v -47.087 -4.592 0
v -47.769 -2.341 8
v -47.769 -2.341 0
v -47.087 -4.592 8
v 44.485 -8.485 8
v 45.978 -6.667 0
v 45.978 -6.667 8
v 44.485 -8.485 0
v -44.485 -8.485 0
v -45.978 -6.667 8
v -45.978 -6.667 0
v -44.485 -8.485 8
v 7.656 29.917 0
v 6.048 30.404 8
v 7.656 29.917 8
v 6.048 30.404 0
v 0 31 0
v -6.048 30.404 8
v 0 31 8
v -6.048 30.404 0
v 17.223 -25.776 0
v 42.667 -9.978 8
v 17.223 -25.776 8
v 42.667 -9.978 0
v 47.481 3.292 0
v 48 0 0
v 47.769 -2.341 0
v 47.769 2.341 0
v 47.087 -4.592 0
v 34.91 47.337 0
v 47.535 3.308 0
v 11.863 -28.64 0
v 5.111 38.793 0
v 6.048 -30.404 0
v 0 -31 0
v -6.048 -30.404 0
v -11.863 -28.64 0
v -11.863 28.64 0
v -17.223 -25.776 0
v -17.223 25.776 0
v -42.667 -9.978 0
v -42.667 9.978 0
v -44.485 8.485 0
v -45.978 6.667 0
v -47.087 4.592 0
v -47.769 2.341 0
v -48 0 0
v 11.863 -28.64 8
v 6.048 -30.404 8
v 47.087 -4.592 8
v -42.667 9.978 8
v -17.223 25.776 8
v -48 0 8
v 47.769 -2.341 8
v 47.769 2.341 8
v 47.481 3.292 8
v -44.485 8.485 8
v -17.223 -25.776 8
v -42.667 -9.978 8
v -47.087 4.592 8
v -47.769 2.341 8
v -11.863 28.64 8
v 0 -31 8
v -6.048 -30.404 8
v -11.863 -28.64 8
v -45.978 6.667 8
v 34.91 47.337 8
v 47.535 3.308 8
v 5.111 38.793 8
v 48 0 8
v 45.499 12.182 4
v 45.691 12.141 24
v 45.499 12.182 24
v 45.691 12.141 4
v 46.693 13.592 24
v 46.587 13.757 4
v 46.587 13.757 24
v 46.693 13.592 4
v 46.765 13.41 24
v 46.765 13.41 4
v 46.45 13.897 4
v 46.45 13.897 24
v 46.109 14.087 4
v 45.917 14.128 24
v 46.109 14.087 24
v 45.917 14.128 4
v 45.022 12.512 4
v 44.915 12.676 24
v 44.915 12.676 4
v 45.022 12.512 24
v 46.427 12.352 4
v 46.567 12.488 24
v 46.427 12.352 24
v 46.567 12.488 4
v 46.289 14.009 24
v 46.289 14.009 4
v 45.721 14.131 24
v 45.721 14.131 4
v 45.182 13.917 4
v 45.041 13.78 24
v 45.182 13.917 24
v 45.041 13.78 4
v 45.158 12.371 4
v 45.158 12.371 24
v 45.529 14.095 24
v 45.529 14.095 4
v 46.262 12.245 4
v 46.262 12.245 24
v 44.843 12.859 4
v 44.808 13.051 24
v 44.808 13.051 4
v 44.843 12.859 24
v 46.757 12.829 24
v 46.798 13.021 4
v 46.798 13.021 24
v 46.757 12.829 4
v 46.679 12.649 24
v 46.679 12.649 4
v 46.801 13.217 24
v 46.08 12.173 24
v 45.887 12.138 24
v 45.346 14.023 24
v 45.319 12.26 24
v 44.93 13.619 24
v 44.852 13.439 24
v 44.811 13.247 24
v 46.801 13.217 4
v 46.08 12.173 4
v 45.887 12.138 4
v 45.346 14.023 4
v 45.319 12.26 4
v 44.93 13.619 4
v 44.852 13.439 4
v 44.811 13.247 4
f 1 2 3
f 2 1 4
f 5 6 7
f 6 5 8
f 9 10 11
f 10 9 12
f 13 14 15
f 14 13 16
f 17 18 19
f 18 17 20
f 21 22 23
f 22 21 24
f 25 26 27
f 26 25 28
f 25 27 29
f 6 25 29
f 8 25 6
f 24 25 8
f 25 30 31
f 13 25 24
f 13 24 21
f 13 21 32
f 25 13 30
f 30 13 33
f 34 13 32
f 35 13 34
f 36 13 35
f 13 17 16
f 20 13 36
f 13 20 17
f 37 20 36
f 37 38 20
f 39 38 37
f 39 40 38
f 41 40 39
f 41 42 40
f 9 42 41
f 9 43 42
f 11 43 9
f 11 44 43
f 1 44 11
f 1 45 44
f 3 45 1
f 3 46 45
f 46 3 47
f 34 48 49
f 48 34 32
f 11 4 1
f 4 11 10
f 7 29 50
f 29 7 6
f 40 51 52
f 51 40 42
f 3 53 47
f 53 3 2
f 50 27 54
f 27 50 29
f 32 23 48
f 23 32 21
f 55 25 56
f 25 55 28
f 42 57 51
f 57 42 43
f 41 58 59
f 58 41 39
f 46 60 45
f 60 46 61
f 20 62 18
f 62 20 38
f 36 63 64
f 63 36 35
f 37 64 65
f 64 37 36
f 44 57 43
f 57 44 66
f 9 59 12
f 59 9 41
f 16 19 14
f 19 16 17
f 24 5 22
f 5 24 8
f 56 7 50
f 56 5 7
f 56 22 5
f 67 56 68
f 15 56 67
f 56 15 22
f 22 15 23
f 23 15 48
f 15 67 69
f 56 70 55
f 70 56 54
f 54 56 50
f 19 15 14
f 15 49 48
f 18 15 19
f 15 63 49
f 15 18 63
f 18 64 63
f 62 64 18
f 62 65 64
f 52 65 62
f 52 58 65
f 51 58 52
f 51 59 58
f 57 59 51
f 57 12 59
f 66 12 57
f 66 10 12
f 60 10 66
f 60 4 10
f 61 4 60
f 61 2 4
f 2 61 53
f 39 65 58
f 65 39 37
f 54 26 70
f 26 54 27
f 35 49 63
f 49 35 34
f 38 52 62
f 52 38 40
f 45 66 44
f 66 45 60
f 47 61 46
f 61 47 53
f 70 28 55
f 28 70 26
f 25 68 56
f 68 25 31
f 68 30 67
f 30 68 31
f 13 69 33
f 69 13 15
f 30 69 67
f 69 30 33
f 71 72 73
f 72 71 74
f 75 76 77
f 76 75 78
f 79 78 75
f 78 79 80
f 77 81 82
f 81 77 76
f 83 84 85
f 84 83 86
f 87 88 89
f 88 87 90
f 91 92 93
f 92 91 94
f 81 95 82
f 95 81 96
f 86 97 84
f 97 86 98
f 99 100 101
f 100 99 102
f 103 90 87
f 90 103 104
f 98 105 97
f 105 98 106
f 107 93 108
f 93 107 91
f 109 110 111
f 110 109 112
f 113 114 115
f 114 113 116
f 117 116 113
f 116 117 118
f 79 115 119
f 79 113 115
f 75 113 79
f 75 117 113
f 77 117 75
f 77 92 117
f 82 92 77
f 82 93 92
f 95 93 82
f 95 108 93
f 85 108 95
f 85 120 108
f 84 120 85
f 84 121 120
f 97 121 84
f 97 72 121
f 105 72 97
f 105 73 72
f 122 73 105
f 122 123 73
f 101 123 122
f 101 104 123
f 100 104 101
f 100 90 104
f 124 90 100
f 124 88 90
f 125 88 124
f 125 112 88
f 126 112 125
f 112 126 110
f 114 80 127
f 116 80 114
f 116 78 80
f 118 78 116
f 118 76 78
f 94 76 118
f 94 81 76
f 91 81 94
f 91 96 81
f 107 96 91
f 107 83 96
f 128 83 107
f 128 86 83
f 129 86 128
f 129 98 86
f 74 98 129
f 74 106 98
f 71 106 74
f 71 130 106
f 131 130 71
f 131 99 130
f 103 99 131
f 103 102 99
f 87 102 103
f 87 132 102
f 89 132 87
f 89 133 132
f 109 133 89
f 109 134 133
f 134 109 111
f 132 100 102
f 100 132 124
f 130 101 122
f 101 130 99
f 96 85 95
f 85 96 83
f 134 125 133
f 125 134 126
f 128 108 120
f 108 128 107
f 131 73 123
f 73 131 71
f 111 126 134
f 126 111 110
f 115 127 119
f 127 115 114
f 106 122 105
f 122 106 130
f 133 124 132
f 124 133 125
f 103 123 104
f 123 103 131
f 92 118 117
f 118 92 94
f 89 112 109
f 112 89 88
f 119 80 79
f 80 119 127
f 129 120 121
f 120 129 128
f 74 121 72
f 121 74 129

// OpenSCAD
function in_to_mm(in) = in * 25.4;

$fn = 32;

isolator_thickness = 8;

throat_diamiter = 45;

bolt_d = 8.5;
bolt_spacing = 72;
bolt_spacing_center = bolt_spacing/2;

flange_ear_r = 12;
flange_w = 62;
flange_h = bolt_spacing_center + flange_ear_r;
flange_angle = 16;

port_extention_x_offset = cos(flange_angle) * flange_ear_r;
port_extention_y = sin(flange_angle) * flange_ear_r;
port_extention_x = bolt_spacing_center + port_extention_x_offset;
port_extention_offset_hyp = sqrt(pow(port_extention_x,2) + pow(port_extention_y,2));
port_extention_w = port_extention_offset_hyp * cos(flange_angle);
port_d = 2;
port_l = port_extention_offset_hyp * cos(flange_angle);
port_x = port_extention_offset_hyp; 

tube_od = 3;
tube_depth = 10;

// o-ring dash code -135
oring_groove_h = in_to_mm(0.078);
oring_groove_w = in_to_mm(0.121);
oring_groove_id = in_to_mm(1.954);

module radial_tile(r, n){
	for (i = [0:n]) {
		rotate([0,0,360 / n * i])translate([r,0,0]) 
			children();
	}
}

module flange(){
	hull(){
		cylinder(d = flange_w,h =isolator_thickness);
		radial_tile(bolt_spacing_center, 2) cylinder(r = flange_ear_r, h = isolator_thickness);
	}
}

module port_extention(){
	translate([port_extention_x, port_extention_y,0])
	rotate(a = [0,0,90 + flange_angle]) 
		cube([port_extention_w,flange_w/2,isolator_thickness]); 	
}

module port(){
	rotate([0,0,flange_angle])translate([port_x,0,isolator_thickness/2]){
		cylinder(h=20, r=1);
	}
}

union(){
flange();
port_extention();
}
port();
